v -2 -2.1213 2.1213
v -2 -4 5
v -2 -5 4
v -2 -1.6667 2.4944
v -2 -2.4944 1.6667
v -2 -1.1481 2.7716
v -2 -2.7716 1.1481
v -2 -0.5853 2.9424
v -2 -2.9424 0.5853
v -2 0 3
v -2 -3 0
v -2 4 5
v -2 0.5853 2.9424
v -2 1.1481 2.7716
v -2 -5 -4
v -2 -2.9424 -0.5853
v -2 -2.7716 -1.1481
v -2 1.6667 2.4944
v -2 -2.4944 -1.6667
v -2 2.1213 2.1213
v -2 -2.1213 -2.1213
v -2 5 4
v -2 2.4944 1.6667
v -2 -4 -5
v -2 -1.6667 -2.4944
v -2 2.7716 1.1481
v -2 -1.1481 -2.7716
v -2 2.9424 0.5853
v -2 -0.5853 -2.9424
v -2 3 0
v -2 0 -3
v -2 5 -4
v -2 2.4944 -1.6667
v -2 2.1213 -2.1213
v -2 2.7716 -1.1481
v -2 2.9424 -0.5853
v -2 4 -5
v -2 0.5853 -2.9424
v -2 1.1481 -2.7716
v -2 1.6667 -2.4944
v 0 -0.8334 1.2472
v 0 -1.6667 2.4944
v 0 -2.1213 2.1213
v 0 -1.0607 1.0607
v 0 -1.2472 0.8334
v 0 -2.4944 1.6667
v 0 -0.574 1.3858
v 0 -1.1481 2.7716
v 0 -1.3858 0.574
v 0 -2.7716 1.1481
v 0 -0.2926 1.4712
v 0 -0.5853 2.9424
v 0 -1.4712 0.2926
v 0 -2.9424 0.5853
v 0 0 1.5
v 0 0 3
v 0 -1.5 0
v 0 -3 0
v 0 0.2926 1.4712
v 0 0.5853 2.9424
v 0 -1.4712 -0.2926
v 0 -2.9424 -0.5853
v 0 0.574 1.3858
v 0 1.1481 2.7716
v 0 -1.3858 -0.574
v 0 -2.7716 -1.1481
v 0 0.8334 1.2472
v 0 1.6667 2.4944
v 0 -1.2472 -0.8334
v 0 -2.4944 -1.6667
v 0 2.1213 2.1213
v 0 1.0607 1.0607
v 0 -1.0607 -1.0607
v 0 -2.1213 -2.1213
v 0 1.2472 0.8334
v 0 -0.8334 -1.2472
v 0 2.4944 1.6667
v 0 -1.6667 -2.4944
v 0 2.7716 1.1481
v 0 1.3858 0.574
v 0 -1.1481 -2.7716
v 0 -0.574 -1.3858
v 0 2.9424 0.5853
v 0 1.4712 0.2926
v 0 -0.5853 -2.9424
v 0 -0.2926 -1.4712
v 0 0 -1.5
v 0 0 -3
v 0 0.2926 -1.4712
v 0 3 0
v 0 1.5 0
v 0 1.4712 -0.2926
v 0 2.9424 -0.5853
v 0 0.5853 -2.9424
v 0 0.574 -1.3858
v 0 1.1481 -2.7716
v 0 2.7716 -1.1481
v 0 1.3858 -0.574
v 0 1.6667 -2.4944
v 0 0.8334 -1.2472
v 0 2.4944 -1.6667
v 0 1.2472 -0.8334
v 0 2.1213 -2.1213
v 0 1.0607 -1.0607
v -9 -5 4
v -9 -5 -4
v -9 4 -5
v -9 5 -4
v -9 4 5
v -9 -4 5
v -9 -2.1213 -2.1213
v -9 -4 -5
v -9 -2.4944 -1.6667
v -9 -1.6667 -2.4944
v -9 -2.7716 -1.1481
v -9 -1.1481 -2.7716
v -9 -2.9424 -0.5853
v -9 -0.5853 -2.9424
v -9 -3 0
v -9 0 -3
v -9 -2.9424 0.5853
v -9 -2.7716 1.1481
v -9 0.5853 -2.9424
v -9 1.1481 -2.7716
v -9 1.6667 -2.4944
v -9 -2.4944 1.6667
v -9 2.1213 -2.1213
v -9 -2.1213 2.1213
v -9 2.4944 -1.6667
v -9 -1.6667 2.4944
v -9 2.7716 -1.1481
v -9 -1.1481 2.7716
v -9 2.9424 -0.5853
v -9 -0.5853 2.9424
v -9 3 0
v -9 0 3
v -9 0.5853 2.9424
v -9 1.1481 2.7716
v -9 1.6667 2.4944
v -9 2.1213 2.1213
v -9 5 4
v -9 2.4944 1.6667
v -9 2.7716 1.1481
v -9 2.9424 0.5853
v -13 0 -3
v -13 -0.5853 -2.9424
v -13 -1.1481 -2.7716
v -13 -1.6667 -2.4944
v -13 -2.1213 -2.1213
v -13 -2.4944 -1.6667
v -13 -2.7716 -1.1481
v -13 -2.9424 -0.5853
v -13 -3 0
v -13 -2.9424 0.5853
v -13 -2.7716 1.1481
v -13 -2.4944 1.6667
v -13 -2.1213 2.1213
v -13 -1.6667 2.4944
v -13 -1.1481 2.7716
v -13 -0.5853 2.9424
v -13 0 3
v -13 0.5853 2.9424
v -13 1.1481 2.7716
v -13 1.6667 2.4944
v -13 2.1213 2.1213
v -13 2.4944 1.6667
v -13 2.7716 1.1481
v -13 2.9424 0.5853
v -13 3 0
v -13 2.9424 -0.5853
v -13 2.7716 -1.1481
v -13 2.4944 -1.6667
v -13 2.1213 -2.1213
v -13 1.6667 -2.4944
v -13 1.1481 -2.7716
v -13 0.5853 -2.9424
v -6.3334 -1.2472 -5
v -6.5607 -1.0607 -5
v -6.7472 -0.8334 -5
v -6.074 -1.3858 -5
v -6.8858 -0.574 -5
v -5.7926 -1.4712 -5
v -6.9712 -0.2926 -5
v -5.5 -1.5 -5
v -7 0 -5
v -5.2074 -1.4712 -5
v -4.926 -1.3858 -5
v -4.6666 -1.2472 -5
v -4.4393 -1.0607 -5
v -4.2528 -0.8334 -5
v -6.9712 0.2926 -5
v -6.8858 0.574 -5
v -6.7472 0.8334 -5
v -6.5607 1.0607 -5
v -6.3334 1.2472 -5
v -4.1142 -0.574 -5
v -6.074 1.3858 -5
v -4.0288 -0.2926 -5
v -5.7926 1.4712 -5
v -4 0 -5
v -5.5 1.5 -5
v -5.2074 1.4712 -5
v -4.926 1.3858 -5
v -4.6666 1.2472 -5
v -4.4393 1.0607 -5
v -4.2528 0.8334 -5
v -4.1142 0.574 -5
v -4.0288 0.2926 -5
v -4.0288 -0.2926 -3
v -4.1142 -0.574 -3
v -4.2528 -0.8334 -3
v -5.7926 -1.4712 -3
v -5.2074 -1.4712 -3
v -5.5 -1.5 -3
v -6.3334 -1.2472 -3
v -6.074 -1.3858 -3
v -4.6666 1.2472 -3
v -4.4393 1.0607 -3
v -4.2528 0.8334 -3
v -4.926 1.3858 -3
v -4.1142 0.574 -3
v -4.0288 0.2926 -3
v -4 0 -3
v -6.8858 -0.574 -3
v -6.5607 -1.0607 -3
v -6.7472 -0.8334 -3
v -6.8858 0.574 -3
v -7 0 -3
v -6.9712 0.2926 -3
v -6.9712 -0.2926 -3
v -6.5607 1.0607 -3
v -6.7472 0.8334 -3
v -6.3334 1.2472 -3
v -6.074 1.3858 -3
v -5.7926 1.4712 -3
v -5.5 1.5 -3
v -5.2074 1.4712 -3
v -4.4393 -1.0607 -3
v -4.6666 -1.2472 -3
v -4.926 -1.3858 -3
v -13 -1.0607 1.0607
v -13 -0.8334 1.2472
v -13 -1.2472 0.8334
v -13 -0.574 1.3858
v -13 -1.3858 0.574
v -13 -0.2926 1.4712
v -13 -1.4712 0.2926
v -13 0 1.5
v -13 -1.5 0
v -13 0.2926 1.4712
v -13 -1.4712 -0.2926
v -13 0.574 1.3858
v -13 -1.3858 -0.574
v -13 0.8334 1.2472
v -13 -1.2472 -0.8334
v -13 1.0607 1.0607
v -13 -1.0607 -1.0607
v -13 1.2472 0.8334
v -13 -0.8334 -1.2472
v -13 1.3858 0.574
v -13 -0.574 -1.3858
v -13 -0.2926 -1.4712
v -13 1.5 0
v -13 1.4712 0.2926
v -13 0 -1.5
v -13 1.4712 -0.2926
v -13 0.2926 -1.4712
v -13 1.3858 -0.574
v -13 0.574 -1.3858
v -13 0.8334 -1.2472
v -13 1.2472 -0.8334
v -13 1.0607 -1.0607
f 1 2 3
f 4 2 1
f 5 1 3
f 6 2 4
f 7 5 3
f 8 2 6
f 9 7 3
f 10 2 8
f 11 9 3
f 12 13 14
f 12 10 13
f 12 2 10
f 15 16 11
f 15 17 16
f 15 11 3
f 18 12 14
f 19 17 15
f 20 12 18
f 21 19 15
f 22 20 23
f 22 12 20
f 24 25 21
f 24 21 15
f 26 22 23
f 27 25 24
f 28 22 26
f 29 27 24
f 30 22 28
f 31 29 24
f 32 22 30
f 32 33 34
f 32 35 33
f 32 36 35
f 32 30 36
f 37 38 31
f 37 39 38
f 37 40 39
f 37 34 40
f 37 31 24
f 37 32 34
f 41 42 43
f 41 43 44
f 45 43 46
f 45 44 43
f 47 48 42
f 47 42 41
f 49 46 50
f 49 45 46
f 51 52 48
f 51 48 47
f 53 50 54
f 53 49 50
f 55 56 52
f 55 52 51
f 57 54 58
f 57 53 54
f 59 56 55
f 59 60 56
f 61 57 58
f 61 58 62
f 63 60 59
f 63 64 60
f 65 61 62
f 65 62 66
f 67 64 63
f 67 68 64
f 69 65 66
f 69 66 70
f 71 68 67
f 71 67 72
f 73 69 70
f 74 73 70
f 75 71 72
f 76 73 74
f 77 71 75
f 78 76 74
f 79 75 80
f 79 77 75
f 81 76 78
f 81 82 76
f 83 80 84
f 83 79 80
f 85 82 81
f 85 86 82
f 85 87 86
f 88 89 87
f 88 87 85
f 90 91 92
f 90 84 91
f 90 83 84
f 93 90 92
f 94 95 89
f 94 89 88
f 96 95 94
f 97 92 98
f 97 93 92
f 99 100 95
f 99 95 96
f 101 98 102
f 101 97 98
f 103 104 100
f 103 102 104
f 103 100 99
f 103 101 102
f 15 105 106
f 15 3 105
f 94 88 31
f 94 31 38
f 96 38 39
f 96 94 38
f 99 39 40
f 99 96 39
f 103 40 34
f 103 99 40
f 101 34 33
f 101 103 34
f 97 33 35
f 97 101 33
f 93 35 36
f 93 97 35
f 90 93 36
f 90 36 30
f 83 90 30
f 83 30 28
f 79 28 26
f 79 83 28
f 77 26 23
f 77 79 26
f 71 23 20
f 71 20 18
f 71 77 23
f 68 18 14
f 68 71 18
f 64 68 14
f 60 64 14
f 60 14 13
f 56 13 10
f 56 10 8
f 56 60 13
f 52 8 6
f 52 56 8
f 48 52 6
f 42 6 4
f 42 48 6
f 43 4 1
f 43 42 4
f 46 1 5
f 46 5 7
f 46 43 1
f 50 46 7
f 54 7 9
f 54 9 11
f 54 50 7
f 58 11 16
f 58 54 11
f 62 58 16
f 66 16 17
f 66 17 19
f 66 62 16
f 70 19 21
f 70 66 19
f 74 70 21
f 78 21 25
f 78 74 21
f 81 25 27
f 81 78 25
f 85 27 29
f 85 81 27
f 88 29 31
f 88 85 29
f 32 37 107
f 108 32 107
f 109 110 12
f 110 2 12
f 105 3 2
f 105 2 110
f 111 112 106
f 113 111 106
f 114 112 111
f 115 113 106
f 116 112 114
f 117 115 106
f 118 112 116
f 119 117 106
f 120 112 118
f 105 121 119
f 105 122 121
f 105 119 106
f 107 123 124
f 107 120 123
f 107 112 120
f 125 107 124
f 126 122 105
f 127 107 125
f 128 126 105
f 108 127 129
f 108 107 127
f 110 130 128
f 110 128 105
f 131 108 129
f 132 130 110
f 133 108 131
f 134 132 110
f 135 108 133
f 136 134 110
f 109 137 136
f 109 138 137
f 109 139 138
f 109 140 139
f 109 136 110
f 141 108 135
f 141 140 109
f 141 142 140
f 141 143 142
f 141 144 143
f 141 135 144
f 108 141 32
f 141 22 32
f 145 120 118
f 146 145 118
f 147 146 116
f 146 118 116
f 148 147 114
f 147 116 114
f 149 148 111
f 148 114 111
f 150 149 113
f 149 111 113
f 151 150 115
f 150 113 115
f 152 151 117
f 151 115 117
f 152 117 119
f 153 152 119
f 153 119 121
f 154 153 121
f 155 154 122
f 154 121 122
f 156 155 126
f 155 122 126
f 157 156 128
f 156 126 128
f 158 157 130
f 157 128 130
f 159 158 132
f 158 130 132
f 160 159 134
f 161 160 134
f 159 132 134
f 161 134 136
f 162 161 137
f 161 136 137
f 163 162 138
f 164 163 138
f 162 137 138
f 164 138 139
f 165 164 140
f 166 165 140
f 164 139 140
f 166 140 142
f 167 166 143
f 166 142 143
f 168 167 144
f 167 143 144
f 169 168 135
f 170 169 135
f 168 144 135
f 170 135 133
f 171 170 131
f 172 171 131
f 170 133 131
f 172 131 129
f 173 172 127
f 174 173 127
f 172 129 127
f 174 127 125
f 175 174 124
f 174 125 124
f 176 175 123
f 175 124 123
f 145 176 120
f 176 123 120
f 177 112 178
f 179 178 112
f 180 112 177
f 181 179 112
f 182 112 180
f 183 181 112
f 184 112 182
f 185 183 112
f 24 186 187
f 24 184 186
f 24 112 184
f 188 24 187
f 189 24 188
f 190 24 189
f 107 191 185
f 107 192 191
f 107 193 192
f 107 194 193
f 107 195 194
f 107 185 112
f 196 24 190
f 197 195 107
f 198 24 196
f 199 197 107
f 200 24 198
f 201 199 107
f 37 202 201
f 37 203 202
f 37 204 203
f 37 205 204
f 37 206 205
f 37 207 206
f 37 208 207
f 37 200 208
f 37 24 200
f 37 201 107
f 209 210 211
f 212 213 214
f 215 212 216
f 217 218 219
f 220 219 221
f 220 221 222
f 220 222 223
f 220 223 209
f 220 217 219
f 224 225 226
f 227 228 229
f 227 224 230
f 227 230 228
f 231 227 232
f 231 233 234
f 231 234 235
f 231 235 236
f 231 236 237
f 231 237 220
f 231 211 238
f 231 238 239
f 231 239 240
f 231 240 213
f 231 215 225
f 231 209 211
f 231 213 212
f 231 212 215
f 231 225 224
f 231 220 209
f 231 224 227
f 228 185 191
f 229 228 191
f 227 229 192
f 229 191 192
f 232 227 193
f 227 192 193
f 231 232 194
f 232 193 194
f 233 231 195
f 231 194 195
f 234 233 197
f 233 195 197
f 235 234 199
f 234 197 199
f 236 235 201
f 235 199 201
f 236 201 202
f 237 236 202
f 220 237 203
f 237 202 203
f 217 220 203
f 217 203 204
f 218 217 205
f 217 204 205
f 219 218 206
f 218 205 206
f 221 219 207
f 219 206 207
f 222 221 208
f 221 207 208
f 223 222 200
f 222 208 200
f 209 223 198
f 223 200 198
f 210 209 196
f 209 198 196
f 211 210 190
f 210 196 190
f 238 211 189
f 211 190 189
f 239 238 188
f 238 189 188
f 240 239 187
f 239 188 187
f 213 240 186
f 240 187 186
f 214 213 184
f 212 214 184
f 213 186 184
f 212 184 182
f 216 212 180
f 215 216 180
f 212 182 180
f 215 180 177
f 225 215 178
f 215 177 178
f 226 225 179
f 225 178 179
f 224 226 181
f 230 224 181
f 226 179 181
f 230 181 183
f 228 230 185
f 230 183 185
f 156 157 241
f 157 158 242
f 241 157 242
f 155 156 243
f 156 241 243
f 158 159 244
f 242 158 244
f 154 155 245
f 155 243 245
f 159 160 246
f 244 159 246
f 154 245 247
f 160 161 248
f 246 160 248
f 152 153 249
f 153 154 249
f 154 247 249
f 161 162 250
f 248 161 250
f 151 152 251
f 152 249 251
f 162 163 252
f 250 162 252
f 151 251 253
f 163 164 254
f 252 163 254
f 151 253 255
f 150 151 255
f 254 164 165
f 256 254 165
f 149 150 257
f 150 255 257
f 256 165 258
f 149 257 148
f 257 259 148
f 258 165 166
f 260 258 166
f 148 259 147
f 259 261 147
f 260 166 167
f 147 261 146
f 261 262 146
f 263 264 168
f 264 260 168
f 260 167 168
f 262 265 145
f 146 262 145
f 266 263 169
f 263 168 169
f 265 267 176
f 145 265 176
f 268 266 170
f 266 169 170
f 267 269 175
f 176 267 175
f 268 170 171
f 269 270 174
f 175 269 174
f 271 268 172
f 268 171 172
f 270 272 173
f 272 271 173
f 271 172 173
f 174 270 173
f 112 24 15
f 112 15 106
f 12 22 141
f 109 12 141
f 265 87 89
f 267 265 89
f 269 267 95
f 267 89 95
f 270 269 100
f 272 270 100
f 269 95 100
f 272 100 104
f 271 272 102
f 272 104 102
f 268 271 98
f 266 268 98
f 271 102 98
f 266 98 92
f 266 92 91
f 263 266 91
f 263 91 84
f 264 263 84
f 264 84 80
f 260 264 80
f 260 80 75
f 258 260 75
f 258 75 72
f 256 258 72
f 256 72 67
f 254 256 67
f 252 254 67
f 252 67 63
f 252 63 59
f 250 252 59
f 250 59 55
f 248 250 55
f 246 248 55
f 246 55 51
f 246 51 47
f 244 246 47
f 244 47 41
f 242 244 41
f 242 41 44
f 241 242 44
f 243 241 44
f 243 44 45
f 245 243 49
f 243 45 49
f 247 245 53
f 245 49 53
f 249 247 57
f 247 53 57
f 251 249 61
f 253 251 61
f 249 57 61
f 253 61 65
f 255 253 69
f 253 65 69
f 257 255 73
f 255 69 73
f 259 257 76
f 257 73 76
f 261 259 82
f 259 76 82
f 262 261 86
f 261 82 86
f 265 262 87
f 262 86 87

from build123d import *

# Parameters (mm, degrees)
SKETCH1_W           = 10
SKETCH1_H           = 10
BOSS_EXTRUDE1_DEPTH = 13
SKETCH2_R           = 15.353568197
SKETCH2_R_2         = 3
CUT_EXTRUDE1_DEPTH  = 2
CUT_EXTRUDE2_START  = -4
SKETCH3_R           = 15.635411304
SKETCH3_R_2         = 3
CUT_EXTRUDE2_DEPTH  = 4
SKETCH4_R           = 1.5
CUT_EXTRUDE3_DEPTH  = 15.798648587
CHAMFER1_SIZE       = 1
CUT_EXTRUDE4_START  = 5
SKETCH5_R           = 1.5
CUT_EXTRUDE4_DEPTH  = 2


with BuildPart() as part:
    # Sketch1 → Boss-Extrude1 (new body)
    with BuildSketch(Plane(origin=(0, 0, 0), x_dir=(0, 0, -1), z_dir=(1, 0, 0))):
        Rectangle(SKETCH1_W, SKETCH1_H)
    extrude(amount=-BOSS_EXTRUDE1_DEPTH)

    # Sketch2 → Cut-Extrude1 (cut)
    with BuildSketch(Plane(origin=(0, 0, 0), x_dir=(0, 0, -1), z_dir=(1, 0, 0))):
        Circle(SKETCH2_R)
        Circle(SKETCH2_R_2, mode=Mode.SUBTRACT)
    extrude(amount=-CUT_EXTRUDE1_DEPTH, mode=Mode.SUBTRACT)

    # Sketch3 → Cut-Extrude2 (cut)
    with BuildSketch(Plane.ZY.offset(13).offset(CUT_EXTRUDE2_START)):
        Circle(SKETCH3_R)
        with Locations(Location((0, 0, 0), (0, 0, 180))):
            Circle(SKETCH3_R_2, mode=Mode.SUBTRACT)
    extrude(amount=CUT_EXTRUDE2_DEPTH, mode=Mode.SUBTRACT)

    # Sketch4 → Cut-Extrude3 (cut, through all)
    with BuildSketch(Plane(origin=(0, 0, 0), x_dir=(0, 0, -1), z_dir=(1, 0, 0))):
        Circle(SKETCH4_R)
    extrude(amount=-CUT_EXTRUDE3_DEPTH, mode=Mode.SUBTRACT)

    # Chamfer1
    chamfer1_edges = [part.edges().sort_by_distance(p)[0] for p in [
        (-5.5, -5, -5),
        (-5.5, -5, 5),
        (-5.5, 5, -5),
        (-5.5, 5, 5),
    ]]
    chamfer(chamfer1_edges, length=CHAMFER1_SIZE)

    # Sketch5 → Cut-Extrude4 (cut)
    with BuildSketch(Plane(origin=(0, 0, 0), x_dir=(-1, 0, 0), z_dir=(0, 0, -1)).offset(CUT_EXTRUDE4_START)):
        with Locations((5.5, 0)):
            Circle(SKETCH5_R)
    extrude(amount=-CUT_EXTRUDE4_DEPTH, mode=Mode.SUBTRACT)


solid = part.part
